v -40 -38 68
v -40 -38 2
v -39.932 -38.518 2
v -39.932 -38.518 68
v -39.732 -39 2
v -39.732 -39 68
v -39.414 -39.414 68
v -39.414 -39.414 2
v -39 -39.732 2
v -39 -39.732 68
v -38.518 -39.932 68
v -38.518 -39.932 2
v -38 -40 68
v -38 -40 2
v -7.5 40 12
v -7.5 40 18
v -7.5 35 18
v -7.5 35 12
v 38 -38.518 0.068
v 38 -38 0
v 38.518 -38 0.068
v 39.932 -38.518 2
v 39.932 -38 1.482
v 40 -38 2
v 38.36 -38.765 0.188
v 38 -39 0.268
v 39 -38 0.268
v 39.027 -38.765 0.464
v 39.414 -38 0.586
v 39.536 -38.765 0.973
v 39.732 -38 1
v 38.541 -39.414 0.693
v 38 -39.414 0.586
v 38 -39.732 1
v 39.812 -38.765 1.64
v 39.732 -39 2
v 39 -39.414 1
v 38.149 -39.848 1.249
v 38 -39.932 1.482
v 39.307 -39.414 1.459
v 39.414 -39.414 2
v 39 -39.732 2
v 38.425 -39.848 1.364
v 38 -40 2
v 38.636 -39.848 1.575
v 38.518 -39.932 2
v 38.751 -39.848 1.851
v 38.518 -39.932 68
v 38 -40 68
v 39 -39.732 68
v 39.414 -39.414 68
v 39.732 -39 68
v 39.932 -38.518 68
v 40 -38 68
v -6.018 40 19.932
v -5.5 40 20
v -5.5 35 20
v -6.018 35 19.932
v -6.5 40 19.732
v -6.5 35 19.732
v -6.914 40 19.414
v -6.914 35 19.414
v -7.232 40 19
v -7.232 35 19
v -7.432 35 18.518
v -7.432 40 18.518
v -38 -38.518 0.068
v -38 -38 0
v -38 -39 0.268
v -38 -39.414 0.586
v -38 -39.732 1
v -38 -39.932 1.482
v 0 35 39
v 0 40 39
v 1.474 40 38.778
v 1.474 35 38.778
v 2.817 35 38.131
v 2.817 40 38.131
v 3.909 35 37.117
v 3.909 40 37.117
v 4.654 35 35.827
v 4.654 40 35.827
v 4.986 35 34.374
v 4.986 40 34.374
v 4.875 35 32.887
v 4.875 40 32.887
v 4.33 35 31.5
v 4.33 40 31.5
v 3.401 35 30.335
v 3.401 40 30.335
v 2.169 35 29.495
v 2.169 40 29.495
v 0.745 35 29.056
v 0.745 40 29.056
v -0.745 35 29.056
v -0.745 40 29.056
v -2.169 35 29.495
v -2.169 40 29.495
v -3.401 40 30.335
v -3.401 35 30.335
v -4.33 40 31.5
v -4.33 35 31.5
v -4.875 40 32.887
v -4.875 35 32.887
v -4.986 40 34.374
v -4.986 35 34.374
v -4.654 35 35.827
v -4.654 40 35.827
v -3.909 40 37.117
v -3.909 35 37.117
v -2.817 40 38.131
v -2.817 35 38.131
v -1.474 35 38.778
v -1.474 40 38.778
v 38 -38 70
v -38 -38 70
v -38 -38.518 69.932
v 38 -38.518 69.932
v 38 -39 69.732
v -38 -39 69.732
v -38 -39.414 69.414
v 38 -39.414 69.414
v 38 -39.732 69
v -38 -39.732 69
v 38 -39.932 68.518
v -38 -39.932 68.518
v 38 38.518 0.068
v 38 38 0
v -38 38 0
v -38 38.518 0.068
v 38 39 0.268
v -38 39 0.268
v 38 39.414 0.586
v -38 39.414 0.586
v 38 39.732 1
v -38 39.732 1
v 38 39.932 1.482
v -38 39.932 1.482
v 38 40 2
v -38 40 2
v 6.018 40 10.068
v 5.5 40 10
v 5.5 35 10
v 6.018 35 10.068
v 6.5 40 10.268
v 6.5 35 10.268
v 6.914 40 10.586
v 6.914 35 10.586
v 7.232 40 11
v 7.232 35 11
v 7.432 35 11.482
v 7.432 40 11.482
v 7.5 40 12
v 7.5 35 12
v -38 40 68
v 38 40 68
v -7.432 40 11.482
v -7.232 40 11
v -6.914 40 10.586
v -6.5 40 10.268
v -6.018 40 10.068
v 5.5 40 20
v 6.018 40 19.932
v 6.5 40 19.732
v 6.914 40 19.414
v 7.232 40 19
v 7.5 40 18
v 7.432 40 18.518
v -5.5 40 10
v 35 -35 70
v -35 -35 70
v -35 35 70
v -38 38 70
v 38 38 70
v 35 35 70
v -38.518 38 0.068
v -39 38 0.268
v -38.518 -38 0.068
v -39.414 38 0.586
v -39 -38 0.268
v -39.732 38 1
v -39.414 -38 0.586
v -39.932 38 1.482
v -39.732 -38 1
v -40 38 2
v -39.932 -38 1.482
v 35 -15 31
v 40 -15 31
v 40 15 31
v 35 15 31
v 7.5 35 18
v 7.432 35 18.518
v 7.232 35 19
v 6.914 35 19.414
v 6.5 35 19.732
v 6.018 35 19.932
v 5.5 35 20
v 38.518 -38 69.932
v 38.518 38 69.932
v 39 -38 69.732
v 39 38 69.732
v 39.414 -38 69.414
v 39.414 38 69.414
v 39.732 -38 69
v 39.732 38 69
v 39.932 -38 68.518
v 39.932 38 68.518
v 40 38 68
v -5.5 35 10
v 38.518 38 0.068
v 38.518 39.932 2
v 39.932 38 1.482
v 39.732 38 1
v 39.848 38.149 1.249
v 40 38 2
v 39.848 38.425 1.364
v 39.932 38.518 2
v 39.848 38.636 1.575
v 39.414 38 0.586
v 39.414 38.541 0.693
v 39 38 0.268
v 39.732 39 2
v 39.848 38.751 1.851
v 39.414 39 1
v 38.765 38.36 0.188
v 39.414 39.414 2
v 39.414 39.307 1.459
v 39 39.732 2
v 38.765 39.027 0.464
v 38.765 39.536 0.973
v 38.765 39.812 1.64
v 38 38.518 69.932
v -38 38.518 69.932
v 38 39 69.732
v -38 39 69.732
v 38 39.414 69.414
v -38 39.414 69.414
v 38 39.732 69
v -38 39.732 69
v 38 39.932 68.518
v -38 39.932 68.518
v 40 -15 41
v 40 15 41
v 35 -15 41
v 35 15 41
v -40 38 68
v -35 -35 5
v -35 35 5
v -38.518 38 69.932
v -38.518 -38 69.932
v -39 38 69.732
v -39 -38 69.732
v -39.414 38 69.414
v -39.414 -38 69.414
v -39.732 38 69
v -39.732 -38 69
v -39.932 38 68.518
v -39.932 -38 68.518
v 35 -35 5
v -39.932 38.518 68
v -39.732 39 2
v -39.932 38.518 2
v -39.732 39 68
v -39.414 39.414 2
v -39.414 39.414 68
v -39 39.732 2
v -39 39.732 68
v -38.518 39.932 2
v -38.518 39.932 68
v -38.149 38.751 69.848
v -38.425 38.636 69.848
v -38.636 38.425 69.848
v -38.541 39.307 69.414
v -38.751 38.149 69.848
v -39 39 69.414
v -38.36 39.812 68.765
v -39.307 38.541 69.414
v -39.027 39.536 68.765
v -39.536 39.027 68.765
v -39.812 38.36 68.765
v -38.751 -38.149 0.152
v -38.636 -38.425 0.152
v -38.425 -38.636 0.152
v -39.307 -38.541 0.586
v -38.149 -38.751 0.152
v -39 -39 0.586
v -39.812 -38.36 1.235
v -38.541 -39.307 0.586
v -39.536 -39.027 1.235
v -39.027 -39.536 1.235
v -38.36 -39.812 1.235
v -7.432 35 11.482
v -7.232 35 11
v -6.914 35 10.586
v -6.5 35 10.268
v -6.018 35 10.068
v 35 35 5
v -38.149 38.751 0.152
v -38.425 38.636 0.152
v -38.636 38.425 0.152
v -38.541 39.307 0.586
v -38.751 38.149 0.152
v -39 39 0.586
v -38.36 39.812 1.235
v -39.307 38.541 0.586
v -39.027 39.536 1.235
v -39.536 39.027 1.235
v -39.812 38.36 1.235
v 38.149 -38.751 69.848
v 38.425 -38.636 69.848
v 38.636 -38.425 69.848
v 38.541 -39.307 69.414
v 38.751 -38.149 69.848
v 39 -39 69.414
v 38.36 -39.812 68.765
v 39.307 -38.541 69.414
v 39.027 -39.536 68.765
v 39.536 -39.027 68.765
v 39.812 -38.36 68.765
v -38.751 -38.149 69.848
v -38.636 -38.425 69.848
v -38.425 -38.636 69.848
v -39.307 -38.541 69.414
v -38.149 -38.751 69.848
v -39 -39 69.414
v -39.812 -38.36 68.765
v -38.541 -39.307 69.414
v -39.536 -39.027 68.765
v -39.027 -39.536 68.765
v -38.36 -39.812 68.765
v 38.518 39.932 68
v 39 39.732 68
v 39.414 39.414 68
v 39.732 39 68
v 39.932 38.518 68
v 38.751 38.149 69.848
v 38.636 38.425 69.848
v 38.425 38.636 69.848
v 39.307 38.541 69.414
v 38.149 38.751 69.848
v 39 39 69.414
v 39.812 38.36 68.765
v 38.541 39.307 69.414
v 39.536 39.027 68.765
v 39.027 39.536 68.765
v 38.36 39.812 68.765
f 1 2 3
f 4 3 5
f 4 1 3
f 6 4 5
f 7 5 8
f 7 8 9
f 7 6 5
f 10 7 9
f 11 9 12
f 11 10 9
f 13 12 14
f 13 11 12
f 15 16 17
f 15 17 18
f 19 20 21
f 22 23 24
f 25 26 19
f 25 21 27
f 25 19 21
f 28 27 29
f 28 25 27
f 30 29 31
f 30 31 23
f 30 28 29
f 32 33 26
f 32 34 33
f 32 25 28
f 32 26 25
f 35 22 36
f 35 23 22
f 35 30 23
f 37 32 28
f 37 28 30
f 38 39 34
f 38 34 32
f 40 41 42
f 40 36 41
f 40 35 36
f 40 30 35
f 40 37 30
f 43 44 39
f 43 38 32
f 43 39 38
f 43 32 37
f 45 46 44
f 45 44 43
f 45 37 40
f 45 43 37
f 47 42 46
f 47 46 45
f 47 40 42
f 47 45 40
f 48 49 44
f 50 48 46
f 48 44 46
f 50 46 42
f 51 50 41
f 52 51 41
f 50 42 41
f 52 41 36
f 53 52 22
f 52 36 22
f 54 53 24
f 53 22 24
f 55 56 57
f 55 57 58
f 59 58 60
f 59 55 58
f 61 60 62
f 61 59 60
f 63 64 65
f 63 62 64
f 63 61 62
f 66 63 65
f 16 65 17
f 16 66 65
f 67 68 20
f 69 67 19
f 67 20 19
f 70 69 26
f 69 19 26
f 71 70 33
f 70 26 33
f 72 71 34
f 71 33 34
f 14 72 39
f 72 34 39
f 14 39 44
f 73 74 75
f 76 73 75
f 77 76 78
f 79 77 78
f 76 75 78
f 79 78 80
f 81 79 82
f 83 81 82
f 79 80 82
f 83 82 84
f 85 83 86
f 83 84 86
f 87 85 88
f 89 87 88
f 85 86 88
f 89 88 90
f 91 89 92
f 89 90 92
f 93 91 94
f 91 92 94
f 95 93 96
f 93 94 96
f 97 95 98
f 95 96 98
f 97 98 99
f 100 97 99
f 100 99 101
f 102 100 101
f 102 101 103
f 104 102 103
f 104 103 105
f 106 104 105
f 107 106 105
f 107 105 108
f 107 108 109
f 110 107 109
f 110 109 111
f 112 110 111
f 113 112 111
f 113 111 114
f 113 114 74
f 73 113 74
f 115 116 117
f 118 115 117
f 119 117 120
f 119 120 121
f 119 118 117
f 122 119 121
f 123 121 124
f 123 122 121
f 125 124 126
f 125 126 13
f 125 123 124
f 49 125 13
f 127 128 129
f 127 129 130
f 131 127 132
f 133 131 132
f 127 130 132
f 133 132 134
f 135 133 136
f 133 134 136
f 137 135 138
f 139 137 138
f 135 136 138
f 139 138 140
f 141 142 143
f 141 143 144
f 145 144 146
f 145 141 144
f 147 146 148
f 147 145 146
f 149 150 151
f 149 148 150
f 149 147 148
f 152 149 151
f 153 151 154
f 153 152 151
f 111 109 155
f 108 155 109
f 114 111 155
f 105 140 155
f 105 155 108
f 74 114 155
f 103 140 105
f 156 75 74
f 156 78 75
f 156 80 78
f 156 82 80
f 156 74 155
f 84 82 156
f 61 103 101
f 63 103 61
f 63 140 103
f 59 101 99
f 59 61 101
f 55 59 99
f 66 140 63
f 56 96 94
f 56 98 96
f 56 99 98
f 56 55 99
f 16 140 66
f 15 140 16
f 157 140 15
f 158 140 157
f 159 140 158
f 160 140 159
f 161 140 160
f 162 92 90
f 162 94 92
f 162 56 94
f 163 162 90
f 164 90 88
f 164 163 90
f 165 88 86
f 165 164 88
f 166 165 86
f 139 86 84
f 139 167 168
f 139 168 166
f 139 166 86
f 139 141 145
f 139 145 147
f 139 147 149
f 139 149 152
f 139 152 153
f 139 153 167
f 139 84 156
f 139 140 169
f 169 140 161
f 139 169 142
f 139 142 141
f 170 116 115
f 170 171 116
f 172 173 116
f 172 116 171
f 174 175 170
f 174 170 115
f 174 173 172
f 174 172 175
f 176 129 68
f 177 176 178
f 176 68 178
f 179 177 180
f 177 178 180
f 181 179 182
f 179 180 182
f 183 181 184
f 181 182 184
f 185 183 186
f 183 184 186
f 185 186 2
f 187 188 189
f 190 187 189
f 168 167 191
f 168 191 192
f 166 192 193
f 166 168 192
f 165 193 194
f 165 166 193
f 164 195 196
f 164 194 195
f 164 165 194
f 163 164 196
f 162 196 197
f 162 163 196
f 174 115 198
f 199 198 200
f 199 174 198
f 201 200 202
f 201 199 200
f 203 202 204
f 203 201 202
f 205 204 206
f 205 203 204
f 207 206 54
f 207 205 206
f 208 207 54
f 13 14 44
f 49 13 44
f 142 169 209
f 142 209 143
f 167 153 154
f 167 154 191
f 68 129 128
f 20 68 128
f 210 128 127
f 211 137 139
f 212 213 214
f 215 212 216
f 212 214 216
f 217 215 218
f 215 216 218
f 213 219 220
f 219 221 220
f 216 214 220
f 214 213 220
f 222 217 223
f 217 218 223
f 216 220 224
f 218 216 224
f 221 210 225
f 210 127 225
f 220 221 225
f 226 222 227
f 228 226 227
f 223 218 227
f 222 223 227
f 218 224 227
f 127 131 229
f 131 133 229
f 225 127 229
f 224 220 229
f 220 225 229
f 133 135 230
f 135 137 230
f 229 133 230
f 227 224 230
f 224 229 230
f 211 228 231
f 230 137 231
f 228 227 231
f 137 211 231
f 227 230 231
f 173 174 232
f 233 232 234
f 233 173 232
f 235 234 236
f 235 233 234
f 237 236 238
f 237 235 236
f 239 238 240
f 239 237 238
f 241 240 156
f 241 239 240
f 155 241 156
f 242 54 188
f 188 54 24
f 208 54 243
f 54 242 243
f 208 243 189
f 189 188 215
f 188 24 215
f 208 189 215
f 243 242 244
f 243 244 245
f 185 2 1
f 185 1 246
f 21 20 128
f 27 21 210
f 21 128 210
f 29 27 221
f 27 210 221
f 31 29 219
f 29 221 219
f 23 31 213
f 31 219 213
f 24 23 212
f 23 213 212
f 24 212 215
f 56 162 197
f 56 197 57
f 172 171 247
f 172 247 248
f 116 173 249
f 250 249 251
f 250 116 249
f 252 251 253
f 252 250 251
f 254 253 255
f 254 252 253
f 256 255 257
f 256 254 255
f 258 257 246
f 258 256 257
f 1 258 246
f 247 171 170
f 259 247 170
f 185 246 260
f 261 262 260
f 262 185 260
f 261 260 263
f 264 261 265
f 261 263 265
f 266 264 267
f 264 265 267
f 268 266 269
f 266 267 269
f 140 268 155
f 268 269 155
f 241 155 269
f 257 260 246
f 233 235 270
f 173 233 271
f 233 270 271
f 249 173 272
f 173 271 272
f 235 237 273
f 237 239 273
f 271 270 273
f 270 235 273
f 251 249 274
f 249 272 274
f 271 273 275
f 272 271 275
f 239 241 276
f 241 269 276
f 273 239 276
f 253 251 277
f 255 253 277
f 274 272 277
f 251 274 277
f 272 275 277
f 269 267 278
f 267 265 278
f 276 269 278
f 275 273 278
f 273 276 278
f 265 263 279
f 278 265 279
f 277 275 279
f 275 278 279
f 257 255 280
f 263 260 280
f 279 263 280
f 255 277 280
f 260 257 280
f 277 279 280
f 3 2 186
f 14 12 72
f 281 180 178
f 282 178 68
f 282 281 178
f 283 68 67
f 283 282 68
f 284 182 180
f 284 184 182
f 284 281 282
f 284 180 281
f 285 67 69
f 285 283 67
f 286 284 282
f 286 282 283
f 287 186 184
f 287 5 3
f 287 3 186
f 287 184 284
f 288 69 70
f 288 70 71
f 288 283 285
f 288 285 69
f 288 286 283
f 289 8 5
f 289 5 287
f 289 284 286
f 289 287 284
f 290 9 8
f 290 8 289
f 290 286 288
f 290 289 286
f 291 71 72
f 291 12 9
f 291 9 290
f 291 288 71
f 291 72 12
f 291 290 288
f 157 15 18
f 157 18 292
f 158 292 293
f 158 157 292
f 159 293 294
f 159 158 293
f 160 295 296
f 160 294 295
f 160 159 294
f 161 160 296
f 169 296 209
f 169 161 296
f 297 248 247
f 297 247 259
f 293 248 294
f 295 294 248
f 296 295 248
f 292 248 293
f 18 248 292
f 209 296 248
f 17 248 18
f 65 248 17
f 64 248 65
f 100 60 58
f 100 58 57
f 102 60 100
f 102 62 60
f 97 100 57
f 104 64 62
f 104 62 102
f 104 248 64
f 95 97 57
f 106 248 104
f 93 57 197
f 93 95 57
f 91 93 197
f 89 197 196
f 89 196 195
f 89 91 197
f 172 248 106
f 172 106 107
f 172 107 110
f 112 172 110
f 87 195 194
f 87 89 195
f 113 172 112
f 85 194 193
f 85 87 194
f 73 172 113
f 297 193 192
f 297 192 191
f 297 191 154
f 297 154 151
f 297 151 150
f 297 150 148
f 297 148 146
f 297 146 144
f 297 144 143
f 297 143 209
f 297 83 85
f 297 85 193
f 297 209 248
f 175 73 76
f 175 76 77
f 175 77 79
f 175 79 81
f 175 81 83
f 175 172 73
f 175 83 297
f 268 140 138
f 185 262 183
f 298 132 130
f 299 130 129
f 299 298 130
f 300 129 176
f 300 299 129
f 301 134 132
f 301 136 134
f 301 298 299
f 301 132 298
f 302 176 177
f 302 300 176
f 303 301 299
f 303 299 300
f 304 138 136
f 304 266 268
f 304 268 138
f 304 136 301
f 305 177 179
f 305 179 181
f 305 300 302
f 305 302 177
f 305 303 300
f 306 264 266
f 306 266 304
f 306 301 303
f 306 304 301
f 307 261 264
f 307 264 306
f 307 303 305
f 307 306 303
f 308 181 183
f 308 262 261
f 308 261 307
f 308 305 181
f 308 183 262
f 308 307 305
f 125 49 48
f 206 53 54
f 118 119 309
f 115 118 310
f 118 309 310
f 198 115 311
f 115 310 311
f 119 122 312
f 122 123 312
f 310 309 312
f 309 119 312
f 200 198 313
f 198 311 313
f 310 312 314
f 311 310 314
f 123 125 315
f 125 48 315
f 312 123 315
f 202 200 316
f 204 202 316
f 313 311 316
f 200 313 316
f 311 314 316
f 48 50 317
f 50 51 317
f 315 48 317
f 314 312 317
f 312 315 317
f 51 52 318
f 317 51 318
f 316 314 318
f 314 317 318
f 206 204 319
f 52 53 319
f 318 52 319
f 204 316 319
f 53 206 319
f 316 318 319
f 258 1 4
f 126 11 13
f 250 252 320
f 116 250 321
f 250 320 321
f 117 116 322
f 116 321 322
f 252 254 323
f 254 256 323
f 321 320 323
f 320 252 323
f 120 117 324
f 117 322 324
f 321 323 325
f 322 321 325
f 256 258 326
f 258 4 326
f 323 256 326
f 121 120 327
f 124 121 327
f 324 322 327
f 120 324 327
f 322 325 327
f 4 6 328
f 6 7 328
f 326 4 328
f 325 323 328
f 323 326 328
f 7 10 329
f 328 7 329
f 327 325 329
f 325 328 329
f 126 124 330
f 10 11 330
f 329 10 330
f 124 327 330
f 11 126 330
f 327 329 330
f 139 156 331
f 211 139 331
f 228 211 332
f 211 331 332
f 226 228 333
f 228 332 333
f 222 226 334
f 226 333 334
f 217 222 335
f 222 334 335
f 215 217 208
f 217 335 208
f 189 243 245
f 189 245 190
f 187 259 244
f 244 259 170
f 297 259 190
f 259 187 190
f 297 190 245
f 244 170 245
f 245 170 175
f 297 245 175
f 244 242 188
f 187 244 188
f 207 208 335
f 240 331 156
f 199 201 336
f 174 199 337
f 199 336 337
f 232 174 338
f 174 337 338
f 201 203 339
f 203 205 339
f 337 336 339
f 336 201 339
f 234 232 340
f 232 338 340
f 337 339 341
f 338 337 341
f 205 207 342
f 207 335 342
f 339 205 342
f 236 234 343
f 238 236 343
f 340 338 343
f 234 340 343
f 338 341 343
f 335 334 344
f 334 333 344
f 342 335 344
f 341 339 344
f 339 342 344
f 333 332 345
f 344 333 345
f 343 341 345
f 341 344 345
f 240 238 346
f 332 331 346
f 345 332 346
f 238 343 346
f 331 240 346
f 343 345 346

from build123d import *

# Parameters (mm, degrees)
SKETCH_1_W          = 80
SKETCH_1_H          = 80
EXTRUDE_1_DEPTH     = 70
SKETCH_2_W          = 70
SKETCH_2_H          = 70
CUT_EXTRUDE_1_DEPTH = 65
FILLET_1_R          = 2
FILLET_2_R          = 2
FILLET_3_R          = 2
CUT_EXTRUDE_3_DEPTH = 10
SKETCH_4_W          = 10
SKETCH_4_H          = 30
CUT_EXTRUDE_4_DEPTH = 10
SKETCH_5_R          = 5
CUT_EXTRUDE_5_DEPTH = 10
FILLET_4_R          = 2


with BuildPart() as part:
    # Эскиз1 → Бобышка-Вытянуть1 (new body)
    with BuildSketch(Plane.XY):
        Rectangle(SKETCH_1_W, SKETCH_1_H)
    extrude(amount=EXTRUDE_1_DEPTH)

    # Эскиз2 → Вырез-Вытянуть1 (cut)
    with BuildSketch(Plane.XY.offset(70)):
        Rectangle(SKETCH_2_W, SKETCH_2_H)
    extrude(amount=-CUT_EXTRUDE_1_DEPTH, mode=Mode.SUBTRACT)

    # Скругление1
    fillet_1_edges = [part.edges().sort_by_distance(p)[0] for p in [
        (-40, 40, 35),
        (-40, -40, 35),
    ]]
    fillet(fillet_1_edges, radius=FILLET_1_R)

    # Скругление2
    fillet_2_edges = [part.edges().sort_by_distance(p)[0] for p in [
        (1, -40, 0),
        (-40, 0, 0),
        (-39.414213562, 39.414213562, 0),
        (-39.414213562, -39.414213562, 0),
        (1, 40, 0),
        (40, 0, 0),
        (40, 40, 35),
    ]]
    fillet(fillet_2_edges, radius=FILLET_2_R)

    # Скругление3
    # the kernel refuses this fillet: 2 mm, written as the material it takes off along each edge
    with BuildSketch(Plane(origin=(38, -38, 2), x_dir=(1, 0, 0), z_dir=(0, -1, 0))) as fillet_3_piece_1_section:
        Polygon((0, 0), (FILLET_3_R, 0), (FILLET_3_R, -FILLET_3_R), (0, -FILLET_3_R), align=None)
    fillet_3_piece_1 = extrude(amount=FILLET_3_R, mode=Mode.PRIVATE)
    fillet_3_piece_1 = fillet_3_piece_1 - Plane(origin=(38, -38, 2), x_dir=(-0.7071067811865475, 0, 0.7071067811865475), z_dir=(0, -1, 0)) * Sphere(FILLET_3_R, mode=Mode.PRIVATE)
    add(fillet_3_piece_1, mode=Mode.SUBTRACT)
    with BuildSketch(Plane(origin=(40, -40, 2), x_dir=(-1, 0, 0), z_dir=(0, 0, 1))) as fillet_3_piece_2:
        with BuildLine():
            CenterArc((FILLET_3_R, -FILLET_3_R), FILLET_3_R, 90, 90)
            Line((0, -FILLET_3_R), (0, 0))
            Line((0, 0), (FILLET_3_R, 0))
        make_face()
    extrude(amount=73, mode=Mode.SUBTRACT)

    # Эскиз3 → Вырез-Вытянуть3 (cut)
    with BuildSketch(Plane(origin=(0, 40, 0), x_dir=(1, 0, 0), z_dir=(0, 1, 0))):
        with BuildLine():
            Line((5.5, -20), (-5.5, -20))
            ThreePointArc((-5.5, -20), (-6.914213562, -19.414213562), (-7.5, -18))
            Line((-7.5, -18), (-7.5, -12))
            ThreePointArc((-7.5, -12), (-6.914213562, -10.585786438), (-5.5, -10))
            Line((-5.5, -10), (5.5, -10))
            ThreePointArc((5.5, -10), (6.914213562, -10.585786438), (7.5, -12))
            Line((7.5, -12), (7.5, -18))
            ThreePointArc((7.5, -18), (6.914213562, -19.414213562), (5.5, -20))
        make_face()
    extrude(amount=-CUT_EXTRUDE_3_DEPTH, mode=Mode.SUBTRACT)

    # Эскиз4 → Вырез-Вытянуть4 (cut)
    with BuildSketch(Plane(origin=(40, 0, 0), x_dir=(0, 0, -1), z_dir=(1, 0, 0))):
        with Locations((-36, 0)):
            Rectangle(SKETCH_4_W, SKETCH_4_H)
    extrude(amount=-CUT_EXTRUDE_4_DEPTH, mode=Mode.SUBTRACT)

    # Эскиз5 → Вырез-Вытянуть5 (cut)
    with BuildSketch(Plane(origin=(0, 40, 0), x_dir=(1, 0, 0), z_dir=(0, 1, 0))):
        with Locations(Location((0, -34, 0), (0, 0, 270))):
            Circle(SKETCH_5_R)
    extrude(amount=-CUT_EXTRUDE_5_DEPTH, mode=Mode.SUBTRACT)

    # Скругление4
    fillet_4_edges = [part.edges().sort_by_distance(p)[0] for p in [
        (0, -40, 70),
        (-40, 0, 70),
        (-39.414213562, 39.414213562, 70),
        (-39.414213562, -39.414213562, 70),
        (0, 40, 70),
        (39.414213562, 39.414213562, 70),
        (40, 0, 70),
        (39.414213562, -39.414213562, 70),
    ]]
    fillet(fillet_4_edges, radius=FILLET_4_R)


solid = part.part
